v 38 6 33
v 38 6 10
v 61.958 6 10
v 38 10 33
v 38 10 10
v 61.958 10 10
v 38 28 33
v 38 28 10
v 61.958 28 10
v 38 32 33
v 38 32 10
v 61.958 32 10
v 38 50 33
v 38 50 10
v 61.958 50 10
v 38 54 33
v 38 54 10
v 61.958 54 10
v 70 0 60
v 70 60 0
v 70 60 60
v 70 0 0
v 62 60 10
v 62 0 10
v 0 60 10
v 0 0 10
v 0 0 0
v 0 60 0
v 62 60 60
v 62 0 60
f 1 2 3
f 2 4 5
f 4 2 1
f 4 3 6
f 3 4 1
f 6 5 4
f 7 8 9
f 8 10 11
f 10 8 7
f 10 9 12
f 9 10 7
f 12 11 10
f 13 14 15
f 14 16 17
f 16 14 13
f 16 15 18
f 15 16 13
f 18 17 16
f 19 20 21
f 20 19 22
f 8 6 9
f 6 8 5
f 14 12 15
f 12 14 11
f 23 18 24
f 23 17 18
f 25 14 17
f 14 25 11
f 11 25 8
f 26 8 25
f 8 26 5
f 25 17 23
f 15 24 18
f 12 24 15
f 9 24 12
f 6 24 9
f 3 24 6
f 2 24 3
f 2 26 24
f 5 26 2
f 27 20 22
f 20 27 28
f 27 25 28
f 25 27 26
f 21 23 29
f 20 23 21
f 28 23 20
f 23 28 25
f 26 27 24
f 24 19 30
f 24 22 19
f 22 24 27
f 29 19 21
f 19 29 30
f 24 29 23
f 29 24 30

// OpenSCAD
$fn = 32;

// ----------------------------------------------------------------------
// Rib bracket: 3-gusset L bracket
// ----------------------------------------------------------------------

// --- parameters (mm) ---
base_l = 70;              // foot length, X
base_w = 60;              // foot width, Y
base_t = 10;              // foot thickness
plate_t = 8;              // upright plate thickness
plate_h = 60;             // overall height
gus_l = 24;               // gusset leg along the foot
gus_h = 24;               // gusset height
gus_t = 4;                // gusset thickness
gus_edge = 6;             // gusset margin from the foot edge
n_gus = 3;                // gusset count

gus_pitch = (base_w - 2 * gus_edge - gus_t) / (n_gus - 1);  // gusset pitch

union() {
  cube([base_l, base_w, base_t]);
  translate([base_l - plate_t, 0, base_t - 1])
    cube([plate_t, base_w, plate_h - base_t + 1]);
  for (i = [0 : n_gus - 1])
    translate([base_l - plate_t - gus_l, gus_edge + i * gus_pitch, base_t - 1])
      rotate([-90, 0, 0])
        linear_extrude(height = gus_t)
          polygon(points = [[0, 0], [gus_l + 1, 0], [0, -gus_h]]);
}
